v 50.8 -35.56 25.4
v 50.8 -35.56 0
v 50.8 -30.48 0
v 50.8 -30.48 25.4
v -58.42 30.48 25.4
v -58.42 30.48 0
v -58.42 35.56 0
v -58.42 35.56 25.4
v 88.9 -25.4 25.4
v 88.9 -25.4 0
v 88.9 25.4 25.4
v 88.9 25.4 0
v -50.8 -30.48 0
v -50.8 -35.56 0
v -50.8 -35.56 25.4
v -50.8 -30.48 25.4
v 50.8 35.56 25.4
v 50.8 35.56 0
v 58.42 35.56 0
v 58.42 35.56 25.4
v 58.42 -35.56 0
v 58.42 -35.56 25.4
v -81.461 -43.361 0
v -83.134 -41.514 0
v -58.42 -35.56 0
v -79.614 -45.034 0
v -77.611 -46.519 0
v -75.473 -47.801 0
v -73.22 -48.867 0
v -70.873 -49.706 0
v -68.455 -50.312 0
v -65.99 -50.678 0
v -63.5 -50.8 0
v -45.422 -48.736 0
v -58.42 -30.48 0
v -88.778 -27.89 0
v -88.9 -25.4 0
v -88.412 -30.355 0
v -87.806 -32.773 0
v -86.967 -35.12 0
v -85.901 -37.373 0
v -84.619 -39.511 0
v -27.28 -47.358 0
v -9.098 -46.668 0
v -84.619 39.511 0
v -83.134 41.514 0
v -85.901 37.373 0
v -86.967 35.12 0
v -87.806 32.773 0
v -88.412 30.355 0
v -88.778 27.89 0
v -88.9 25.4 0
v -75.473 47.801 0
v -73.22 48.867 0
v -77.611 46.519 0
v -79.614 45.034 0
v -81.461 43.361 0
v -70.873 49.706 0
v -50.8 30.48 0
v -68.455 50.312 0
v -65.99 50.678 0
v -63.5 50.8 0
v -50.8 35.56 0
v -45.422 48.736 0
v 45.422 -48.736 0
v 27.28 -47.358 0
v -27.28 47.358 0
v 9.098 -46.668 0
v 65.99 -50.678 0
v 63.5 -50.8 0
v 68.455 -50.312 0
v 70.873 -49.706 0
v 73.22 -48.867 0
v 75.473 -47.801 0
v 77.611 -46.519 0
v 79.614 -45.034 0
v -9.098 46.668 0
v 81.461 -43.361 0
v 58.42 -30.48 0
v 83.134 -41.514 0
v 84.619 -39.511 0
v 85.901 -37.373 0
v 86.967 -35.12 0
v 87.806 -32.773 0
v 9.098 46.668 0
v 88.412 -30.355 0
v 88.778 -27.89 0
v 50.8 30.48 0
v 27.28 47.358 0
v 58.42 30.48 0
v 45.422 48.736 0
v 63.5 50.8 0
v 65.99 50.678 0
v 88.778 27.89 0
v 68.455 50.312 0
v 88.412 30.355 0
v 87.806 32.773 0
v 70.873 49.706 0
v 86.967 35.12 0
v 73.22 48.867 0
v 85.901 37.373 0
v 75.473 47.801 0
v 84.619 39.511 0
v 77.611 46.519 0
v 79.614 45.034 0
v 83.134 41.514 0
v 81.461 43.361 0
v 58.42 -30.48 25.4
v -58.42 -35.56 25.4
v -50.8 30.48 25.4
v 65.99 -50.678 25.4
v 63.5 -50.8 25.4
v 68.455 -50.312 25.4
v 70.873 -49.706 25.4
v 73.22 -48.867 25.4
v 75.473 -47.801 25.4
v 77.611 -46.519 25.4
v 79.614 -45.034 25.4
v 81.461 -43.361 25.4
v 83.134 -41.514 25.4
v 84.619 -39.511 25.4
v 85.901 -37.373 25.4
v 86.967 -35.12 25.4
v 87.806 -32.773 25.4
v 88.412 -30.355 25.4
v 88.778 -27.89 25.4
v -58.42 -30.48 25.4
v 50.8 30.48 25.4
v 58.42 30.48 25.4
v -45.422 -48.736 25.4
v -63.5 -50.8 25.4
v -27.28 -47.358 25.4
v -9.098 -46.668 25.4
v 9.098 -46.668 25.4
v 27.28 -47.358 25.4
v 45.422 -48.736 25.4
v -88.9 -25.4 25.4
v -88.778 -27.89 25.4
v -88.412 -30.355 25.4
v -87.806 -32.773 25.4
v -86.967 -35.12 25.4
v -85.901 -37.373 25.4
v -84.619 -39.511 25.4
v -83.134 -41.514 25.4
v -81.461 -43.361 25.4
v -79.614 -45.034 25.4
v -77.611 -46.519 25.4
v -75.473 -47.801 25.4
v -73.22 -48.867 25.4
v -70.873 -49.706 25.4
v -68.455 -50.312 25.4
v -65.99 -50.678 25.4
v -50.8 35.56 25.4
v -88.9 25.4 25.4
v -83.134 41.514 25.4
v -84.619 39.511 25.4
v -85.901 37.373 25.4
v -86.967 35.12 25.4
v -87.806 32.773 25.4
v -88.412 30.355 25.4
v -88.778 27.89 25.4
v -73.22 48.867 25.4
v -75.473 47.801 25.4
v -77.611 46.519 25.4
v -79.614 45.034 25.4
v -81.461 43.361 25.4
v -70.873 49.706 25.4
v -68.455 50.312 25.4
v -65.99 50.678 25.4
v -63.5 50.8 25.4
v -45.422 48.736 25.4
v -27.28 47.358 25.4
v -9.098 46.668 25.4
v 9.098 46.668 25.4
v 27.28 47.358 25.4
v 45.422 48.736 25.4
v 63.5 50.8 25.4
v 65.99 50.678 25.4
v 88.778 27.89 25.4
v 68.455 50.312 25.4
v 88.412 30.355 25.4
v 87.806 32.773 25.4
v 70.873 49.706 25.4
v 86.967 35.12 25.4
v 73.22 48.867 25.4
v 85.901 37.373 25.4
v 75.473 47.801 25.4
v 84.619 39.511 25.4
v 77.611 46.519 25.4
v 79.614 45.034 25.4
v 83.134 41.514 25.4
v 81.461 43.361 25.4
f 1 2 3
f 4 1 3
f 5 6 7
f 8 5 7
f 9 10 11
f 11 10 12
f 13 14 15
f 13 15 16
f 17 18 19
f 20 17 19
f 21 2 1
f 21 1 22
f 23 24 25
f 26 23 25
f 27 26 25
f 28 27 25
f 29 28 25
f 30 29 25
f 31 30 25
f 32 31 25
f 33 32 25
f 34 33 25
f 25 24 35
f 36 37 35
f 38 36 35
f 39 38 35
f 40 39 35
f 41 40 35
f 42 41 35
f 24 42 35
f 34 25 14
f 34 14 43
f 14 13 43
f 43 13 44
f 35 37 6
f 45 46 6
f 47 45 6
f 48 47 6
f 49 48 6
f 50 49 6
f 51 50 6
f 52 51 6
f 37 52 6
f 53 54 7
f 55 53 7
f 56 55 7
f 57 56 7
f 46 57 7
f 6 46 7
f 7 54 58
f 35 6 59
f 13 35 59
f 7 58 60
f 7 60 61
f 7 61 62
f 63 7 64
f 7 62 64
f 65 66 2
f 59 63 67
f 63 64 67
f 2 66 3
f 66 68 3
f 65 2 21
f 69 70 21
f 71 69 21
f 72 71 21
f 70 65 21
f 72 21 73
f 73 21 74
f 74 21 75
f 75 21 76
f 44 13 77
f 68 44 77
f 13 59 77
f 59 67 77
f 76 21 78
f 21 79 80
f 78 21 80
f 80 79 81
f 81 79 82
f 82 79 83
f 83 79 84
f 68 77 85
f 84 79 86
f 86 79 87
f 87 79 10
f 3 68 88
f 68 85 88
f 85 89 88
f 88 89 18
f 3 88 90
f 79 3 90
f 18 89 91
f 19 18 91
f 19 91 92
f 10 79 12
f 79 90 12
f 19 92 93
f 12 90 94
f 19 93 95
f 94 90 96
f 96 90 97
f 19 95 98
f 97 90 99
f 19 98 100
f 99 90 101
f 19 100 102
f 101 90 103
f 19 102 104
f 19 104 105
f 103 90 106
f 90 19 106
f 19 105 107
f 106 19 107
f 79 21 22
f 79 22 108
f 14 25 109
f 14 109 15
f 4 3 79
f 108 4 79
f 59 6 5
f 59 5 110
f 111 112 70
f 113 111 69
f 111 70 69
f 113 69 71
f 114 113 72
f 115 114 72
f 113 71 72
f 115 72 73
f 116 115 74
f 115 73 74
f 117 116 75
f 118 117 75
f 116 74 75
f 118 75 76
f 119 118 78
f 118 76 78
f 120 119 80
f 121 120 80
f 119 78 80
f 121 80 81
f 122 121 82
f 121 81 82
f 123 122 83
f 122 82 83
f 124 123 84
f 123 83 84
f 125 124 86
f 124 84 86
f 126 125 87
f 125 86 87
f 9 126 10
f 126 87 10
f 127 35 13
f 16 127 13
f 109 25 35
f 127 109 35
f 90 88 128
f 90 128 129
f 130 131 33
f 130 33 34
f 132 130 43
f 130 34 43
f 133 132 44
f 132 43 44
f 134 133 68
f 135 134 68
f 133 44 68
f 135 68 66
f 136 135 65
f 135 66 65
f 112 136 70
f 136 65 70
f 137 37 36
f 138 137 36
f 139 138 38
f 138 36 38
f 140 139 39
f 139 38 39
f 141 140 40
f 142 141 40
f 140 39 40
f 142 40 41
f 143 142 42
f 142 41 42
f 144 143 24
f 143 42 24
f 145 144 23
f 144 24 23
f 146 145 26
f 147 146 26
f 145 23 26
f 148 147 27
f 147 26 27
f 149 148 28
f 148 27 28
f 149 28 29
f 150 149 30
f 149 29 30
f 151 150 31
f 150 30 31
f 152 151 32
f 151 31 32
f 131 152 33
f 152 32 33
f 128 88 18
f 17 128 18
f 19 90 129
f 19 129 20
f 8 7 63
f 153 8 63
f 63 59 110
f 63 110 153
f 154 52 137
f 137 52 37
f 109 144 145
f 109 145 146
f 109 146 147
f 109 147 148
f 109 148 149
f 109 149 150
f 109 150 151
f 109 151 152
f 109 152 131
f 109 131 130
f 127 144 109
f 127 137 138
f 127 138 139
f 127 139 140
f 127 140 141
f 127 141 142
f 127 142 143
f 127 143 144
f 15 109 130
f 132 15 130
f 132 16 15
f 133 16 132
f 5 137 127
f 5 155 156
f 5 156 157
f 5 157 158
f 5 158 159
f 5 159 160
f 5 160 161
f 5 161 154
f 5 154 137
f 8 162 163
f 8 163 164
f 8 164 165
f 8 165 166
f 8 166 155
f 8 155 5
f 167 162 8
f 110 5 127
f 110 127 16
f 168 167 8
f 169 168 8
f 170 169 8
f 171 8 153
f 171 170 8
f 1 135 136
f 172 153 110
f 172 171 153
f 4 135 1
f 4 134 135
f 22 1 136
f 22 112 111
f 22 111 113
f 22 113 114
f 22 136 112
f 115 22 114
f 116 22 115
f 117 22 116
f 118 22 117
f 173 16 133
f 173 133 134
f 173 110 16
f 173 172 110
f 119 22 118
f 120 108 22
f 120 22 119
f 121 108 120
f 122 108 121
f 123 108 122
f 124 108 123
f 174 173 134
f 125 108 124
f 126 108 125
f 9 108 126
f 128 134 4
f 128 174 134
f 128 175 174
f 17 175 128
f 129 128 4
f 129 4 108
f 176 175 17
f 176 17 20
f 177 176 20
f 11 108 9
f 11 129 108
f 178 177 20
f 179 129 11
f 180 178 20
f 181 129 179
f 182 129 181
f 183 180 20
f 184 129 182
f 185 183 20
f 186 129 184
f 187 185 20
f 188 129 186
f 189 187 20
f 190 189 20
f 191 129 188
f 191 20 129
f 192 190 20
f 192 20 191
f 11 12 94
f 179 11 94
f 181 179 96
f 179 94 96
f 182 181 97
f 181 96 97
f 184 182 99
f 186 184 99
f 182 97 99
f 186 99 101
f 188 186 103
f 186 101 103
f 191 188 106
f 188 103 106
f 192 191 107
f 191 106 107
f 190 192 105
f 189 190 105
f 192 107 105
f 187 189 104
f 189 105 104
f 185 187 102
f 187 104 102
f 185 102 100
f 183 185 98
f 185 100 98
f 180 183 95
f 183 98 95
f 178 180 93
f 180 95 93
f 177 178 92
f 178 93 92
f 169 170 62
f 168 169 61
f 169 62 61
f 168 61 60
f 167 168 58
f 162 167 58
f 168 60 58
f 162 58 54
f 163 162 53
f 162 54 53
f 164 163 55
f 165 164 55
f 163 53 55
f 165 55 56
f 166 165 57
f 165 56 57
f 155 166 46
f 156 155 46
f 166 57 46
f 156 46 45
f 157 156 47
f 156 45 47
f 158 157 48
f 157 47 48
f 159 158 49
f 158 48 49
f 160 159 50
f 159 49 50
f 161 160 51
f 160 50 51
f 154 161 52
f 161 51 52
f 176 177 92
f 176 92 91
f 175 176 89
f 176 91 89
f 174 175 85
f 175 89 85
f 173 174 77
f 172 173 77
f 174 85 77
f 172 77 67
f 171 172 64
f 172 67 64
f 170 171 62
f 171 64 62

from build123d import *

# Parameters (mm, degrees)
F0_W     = 7.62
F0_H     = 5.08
F1_DEPTH = 25.4


with BuildPart() as f1:
    # F0 (on Top) → F1 (new body)
    with BuildSketch(Plane.XY):
        with BuildLine():
            ThreePointArc((63.5, -50.8), (81.460512, -43.360512), (88.9, -25.4))
            Line((88.9, -25.4), (88.9, 25.4))
            ThreePointArc((88.9, 25.4), (81.460512, 43.360512), (63.5, 50.8))
            ThreePointArc((63.5, 50.8), (0, 46.582226), (-63.5, 50.8))
            ThreePointArc((-63.5, 50.8), (-81.460512, 43.360512), (-88.9, 25.4))
            Line((-88.9, 25.4), (-88.9, -25.4))
            ThreePointArc((-88.9, -25.4), (-81.460512, -43.360512), (-63.5, -50.8))
            ThreePointArc((-63.5, -50.8), (0, -46.582226), (63.5, -50.8))
        make_face()
        with Locations((-54.61, -33.02)):
            Rectangle(F0_W, F0_H, mode=Mode.SUBTRACT)
        with Locations((54.61, -33.02)):
            Rectangle(F0_W, F0_H, mode=Mode.SUBTRACT)
        with Locations((-54.61, 33.02)):
            Rectangle(F0_W, F0_H, mode=Mode.SUBTRACT)
        with Locations((54.61, 33.02)):
            Rectangle(F0_W, F0_H, mode=Mode.SUBTRACT)
    extrude(amount=F1_DEPTH)


solid = f1.part
